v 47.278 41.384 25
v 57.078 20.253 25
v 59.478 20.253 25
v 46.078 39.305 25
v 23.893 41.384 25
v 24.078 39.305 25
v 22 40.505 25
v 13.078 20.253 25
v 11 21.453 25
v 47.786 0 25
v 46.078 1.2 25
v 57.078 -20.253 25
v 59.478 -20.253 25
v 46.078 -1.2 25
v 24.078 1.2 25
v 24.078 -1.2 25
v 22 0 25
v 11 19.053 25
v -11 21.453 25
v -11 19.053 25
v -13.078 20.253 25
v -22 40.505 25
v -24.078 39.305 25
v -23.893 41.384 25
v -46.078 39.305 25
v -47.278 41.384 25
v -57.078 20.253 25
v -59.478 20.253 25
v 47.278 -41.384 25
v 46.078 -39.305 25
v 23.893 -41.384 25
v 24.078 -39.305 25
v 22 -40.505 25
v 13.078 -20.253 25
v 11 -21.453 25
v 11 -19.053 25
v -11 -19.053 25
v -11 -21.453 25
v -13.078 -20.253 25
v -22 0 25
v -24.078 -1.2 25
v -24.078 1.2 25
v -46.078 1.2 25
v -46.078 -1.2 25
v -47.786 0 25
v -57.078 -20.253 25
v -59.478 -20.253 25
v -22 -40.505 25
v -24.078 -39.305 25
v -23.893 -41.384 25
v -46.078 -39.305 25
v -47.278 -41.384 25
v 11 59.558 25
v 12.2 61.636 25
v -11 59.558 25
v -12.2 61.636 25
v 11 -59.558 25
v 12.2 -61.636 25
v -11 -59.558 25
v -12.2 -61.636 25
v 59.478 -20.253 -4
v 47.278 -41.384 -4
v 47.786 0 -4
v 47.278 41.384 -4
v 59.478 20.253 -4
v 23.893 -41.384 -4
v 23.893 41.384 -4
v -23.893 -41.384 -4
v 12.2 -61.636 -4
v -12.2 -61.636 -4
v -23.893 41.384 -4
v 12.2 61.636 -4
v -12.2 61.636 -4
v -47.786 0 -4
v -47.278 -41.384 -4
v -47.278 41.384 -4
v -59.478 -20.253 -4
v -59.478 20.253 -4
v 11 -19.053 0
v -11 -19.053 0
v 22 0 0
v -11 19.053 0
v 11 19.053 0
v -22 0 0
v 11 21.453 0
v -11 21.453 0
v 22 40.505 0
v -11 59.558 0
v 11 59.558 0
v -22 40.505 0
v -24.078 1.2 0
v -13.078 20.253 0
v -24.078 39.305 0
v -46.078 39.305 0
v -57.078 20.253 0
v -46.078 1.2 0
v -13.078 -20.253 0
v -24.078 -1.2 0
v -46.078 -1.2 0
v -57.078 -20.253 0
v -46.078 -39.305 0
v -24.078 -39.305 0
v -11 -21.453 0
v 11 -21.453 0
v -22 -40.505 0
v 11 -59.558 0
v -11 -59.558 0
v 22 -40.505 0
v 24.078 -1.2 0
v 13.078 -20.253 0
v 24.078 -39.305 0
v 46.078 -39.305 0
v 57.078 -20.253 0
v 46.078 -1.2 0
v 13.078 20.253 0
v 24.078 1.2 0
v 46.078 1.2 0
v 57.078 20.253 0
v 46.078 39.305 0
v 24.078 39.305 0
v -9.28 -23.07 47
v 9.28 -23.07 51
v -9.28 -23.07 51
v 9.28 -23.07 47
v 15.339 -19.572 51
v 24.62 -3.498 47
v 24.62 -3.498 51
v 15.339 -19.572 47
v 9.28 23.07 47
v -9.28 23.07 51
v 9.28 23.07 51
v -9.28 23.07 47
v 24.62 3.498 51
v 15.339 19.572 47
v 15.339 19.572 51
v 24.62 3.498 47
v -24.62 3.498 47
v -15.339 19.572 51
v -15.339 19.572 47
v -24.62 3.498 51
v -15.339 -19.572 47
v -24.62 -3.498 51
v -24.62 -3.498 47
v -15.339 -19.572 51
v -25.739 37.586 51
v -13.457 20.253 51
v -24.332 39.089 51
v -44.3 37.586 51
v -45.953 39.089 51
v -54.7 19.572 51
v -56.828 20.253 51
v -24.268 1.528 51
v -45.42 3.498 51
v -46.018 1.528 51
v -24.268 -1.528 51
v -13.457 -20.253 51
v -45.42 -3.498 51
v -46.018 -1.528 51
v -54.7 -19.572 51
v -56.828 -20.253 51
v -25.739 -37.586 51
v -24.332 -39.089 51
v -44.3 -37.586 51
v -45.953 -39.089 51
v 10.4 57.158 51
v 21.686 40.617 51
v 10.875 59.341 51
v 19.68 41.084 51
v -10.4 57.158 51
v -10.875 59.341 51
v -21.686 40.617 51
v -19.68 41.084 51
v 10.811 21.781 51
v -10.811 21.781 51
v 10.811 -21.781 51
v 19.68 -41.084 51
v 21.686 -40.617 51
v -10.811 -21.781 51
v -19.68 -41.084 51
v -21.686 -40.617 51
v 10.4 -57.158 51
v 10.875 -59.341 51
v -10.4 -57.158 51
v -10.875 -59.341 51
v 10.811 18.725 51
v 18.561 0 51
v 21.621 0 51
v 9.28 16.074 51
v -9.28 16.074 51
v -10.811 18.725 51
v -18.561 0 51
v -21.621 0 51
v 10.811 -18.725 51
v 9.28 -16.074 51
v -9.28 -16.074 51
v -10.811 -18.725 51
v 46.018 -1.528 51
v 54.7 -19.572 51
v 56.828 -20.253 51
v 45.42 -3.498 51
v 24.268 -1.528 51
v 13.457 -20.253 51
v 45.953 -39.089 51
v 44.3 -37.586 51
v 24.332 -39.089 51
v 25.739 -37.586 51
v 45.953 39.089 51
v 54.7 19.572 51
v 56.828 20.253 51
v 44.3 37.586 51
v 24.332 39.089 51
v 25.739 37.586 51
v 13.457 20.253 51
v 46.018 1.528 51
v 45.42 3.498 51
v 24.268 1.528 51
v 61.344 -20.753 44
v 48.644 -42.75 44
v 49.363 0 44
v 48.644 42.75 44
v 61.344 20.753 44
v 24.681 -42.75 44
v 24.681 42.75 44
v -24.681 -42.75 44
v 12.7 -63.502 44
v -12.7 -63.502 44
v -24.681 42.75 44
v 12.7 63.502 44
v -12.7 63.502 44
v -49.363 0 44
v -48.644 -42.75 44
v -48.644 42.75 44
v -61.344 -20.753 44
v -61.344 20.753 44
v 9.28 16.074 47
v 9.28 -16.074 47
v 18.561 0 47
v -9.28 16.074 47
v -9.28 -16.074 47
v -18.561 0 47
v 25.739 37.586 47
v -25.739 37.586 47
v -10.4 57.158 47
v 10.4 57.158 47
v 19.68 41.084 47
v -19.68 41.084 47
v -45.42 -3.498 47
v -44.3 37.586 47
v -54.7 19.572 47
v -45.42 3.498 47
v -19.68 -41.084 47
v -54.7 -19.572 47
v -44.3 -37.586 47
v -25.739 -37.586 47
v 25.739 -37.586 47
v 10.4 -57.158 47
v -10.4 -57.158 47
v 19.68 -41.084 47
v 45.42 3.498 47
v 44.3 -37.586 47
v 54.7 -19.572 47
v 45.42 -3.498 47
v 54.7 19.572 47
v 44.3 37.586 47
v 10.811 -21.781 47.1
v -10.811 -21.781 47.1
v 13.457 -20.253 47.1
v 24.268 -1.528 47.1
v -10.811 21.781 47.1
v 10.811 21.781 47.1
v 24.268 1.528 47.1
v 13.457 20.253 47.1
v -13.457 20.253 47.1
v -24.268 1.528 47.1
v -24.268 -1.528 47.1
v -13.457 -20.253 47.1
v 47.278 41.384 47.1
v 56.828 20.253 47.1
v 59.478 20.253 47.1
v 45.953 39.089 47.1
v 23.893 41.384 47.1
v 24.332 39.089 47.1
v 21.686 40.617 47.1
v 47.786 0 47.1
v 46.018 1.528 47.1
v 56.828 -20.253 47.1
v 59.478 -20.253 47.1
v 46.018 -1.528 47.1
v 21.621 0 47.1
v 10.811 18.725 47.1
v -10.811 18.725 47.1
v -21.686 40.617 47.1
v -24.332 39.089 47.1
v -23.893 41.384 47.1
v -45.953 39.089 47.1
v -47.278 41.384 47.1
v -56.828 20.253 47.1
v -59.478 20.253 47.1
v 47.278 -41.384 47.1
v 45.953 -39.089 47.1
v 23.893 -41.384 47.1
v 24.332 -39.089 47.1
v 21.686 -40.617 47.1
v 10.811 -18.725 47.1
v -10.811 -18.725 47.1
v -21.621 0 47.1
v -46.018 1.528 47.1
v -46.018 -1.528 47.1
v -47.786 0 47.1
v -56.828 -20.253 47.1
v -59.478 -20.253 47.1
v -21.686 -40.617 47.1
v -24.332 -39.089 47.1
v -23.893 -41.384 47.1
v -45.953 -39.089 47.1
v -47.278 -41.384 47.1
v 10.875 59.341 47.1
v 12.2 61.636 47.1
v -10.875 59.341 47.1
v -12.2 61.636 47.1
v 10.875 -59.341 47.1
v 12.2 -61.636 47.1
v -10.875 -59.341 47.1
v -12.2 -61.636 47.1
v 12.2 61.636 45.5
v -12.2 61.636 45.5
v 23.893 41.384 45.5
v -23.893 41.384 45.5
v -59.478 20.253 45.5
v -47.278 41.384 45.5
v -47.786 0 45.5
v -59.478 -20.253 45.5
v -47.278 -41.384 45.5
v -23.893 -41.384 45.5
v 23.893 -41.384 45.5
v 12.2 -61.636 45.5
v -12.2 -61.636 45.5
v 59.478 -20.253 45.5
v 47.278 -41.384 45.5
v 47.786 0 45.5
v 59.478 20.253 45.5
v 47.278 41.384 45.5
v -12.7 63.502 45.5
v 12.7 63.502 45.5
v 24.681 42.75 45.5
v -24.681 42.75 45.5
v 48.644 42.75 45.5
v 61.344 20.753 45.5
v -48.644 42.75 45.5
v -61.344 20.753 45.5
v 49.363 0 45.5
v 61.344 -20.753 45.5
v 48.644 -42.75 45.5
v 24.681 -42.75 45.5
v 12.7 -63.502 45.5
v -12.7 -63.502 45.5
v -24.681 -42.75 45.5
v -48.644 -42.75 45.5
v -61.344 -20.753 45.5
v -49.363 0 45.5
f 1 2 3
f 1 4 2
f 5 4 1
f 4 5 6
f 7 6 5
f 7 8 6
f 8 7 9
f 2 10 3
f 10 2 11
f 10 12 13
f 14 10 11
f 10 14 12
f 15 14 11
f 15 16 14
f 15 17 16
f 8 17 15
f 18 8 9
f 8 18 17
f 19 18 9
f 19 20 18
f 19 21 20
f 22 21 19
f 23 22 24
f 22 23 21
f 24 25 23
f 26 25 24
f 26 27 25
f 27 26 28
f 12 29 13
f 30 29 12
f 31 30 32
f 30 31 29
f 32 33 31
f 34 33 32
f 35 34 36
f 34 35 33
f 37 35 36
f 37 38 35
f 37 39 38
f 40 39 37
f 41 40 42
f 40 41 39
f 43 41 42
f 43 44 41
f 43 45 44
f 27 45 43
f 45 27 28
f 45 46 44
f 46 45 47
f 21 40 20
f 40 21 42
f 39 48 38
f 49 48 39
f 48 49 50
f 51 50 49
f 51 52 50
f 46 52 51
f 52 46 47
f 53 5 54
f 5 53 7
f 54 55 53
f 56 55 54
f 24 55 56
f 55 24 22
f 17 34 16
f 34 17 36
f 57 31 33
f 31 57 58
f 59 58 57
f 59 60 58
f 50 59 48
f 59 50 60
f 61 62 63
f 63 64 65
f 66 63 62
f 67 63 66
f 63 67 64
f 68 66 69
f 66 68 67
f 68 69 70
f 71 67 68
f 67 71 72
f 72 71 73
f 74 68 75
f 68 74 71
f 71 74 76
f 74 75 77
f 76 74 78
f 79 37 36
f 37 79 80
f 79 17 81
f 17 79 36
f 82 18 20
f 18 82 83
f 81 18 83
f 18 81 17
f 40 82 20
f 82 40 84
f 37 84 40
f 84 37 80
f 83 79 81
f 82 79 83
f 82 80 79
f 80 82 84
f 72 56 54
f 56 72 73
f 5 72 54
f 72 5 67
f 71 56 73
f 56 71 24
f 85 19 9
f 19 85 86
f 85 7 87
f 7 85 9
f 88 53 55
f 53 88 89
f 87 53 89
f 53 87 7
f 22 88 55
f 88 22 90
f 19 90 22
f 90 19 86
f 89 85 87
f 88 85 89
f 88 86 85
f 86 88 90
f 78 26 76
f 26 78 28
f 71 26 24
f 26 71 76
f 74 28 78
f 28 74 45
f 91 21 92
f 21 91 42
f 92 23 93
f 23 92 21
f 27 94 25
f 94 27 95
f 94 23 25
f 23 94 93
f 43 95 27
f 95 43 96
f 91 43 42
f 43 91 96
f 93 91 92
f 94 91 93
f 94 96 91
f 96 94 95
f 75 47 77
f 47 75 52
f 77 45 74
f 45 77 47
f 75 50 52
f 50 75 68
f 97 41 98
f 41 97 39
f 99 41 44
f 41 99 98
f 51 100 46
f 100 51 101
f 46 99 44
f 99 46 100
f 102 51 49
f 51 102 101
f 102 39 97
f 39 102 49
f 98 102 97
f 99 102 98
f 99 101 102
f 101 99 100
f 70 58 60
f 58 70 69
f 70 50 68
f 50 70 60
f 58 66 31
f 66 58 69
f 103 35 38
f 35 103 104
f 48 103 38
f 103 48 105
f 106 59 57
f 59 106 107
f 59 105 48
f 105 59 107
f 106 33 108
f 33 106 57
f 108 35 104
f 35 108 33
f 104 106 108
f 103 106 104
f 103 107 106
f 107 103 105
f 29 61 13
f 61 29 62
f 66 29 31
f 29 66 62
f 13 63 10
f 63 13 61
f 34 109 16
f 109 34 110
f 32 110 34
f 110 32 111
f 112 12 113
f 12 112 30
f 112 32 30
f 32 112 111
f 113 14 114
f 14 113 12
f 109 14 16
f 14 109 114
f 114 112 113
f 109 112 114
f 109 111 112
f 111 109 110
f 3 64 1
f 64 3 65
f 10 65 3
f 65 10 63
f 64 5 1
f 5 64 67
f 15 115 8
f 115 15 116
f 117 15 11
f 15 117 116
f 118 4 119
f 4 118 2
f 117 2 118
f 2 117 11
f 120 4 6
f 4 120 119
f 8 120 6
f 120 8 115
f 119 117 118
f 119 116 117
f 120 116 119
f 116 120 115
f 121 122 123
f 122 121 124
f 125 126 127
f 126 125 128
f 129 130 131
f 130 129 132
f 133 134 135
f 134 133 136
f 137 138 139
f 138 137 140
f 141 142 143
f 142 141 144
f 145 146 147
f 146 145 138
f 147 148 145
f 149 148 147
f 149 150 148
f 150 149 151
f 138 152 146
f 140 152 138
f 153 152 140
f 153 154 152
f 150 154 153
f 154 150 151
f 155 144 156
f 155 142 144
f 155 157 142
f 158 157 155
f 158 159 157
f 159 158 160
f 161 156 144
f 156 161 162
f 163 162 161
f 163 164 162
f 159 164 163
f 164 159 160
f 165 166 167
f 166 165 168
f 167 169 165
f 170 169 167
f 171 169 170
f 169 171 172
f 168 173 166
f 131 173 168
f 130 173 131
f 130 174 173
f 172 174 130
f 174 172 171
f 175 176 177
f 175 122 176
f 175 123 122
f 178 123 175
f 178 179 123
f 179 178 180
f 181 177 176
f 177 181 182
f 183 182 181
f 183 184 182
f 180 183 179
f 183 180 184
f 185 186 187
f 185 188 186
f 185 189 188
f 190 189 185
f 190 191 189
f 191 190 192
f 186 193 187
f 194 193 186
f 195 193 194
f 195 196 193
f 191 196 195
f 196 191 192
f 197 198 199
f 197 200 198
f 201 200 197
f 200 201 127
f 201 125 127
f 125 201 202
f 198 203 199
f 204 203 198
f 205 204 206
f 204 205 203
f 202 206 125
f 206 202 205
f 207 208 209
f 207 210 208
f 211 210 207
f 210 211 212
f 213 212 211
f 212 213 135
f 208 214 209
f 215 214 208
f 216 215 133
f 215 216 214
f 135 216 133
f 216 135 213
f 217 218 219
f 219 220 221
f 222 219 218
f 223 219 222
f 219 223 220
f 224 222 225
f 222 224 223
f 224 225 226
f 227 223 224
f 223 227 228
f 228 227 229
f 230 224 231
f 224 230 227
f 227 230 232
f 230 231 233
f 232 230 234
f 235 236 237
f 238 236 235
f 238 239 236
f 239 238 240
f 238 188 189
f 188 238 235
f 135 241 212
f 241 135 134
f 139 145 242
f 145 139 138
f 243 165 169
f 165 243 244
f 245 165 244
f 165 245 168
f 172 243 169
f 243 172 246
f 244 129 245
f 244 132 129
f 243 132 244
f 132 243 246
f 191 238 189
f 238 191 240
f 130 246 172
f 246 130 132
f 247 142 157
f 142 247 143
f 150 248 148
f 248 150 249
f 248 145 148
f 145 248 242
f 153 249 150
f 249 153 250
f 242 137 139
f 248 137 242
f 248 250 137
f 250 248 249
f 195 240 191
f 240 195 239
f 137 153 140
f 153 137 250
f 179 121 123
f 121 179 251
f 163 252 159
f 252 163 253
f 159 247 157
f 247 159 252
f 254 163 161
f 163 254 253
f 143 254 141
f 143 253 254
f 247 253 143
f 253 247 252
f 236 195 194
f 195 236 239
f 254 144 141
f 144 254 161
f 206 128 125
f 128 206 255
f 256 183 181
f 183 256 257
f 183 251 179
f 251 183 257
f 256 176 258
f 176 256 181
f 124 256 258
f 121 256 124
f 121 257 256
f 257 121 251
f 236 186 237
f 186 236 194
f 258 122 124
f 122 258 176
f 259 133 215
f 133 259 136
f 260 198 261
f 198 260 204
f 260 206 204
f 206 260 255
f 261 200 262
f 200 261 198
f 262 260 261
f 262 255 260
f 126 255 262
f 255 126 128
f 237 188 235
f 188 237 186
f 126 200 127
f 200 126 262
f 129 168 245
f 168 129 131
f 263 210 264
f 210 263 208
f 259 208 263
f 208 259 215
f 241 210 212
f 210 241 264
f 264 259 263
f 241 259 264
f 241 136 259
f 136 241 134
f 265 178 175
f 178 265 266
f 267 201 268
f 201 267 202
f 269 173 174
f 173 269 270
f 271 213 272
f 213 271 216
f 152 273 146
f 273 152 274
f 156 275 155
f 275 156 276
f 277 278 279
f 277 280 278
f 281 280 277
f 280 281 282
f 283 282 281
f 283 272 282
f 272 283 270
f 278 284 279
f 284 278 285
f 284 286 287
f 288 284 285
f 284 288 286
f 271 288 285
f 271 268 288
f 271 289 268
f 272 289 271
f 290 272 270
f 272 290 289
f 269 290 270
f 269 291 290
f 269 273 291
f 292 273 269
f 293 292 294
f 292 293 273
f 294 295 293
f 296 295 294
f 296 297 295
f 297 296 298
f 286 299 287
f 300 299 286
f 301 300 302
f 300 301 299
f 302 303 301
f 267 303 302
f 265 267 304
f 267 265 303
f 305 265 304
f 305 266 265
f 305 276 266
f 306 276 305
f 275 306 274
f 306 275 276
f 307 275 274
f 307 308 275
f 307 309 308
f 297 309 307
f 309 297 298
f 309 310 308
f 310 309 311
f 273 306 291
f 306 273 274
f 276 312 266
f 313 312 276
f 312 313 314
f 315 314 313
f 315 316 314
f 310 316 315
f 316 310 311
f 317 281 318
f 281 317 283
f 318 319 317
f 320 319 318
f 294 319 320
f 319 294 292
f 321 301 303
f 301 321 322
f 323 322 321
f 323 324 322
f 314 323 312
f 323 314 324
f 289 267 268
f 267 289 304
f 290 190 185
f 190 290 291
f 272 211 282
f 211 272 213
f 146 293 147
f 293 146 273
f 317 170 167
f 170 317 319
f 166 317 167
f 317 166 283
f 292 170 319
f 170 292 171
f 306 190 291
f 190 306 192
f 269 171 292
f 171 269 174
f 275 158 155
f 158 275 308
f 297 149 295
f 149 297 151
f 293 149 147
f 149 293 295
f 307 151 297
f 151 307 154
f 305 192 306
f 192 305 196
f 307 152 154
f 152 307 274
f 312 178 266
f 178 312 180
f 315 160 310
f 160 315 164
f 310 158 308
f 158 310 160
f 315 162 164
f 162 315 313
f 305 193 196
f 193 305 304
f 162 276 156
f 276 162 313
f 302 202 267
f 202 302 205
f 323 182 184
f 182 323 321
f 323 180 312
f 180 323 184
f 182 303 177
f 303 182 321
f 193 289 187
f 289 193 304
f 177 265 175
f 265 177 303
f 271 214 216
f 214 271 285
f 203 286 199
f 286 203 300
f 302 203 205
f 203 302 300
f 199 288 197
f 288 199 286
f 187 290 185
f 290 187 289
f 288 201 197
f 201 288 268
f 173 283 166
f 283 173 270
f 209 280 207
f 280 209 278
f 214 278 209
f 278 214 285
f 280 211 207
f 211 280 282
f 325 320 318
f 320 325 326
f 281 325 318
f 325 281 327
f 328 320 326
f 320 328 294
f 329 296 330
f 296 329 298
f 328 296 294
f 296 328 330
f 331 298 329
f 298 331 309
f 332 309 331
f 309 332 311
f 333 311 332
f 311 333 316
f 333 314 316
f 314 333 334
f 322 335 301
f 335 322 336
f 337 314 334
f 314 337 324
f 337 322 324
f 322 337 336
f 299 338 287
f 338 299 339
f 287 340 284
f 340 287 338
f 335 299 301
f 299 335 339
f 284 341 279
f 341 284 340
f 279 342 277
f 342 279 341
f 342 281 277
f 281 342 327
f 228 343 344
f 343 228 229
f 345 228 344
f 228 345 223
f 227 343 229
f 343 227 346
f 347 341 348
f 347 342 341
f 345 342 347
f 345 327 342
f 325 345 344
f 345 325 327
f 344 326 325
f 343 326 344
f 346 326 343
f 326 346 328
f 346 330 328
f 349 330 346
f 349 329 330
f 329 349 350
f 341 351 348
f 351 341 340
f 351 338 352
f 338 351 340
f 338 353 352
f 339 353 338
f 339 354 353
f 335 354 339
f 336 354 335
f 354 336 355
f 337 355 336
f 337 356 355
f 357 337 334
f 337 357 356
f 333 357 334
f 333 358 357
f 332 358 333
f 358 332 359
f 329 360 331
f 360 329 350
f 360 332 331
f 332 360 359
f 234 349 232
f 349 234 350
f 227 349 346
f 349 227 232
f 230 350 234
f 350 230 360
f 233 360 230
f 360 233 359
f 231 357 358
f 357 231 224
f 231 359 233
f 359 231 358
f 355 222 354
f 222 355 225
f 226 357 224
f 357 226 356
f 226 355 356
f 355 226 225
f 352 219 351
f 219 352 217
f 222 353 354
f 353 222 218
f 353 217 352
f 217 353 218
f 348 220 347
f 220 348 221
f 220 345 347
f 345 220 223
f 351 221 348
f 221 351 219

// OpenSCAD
/* 7-Hex container for small pieces (eg. Board Game)
With lid

I suggest printing the lid with zero top layers and
20% Honeycomb infill

*/

// Which one would you like to see?
part = "both"; // [container:Container Only,lid:Lid Only ,both:Cube and Cylinder]

//inner Height of container
iH = 25;
//floor Height (thickness)
fH = 4;

//inner diamter of each cell
iD = 44;
//Wall width
wW = 2.4;

//lid height (solid part)
lH = 3;
//lid lip height
llH = 4;
//lid lip epsilon/gap
lle = 0.5;
//lid lip overhang, for removal
llo = 1.0;


/* [Hidden] */
e=0.1;
hexRatio = sqrt(3)/2;

if(part != "lid")
	container(iH,fH);

//I made this a little too big and had to crop to my print bed size
//intersection(){ cube([122,128,100],center=true);

if(part != "container")
	translate([0,0,iH+lH+20]) color([0.3,1,0.9])
		lid();
//}
module lid(){
	
	intersection(){
		
	difference(){
	//same shape with thicker walls
	container(llH,lH,wW=wW*hexRatio/2,wM=wW*2);	
	//original shape with +e thicker walls
	translate([0,0,lH+e])
		container(llH,0,wW,wM=lle*2);
	}
	//crop outer edge
	container(0,llH+lH+lle);
	}
	//slightly larger lip to grab onto
	container(0,lH/2,wW=wW+llo);
}

//@param wM wallModifer, increases wall but not layout 
module container(innerHeight, floorHeight,wW=wW,wM=0){
	//central bin
	translate([0,0,-fH])
		hexTube(floorHeight+innerHeight,iD-wM/2, wW+wM,floorHeight);
	//other bins
	for(a = [0:360/6:360]){
		rotate([0,0,a])
		translate([0,iD*hexRatio+wW,-fH])
			hexTube(floorHeight+innerHeight,iD-wM/2, wW+wM,floorHeight);
	}
}

module hexTube(h,d,w,floorHeight=0)
{
	difference(){
		hex(h, d=d+w*2);
		if(h>floorHeight)
			translate([0,0,floorHeight>0?floorHeight:-e])
				hex(h+e*2, d=d);
	}
}

module hex(h,d){
	cylinder(h, d=d, $fn=6);
}
